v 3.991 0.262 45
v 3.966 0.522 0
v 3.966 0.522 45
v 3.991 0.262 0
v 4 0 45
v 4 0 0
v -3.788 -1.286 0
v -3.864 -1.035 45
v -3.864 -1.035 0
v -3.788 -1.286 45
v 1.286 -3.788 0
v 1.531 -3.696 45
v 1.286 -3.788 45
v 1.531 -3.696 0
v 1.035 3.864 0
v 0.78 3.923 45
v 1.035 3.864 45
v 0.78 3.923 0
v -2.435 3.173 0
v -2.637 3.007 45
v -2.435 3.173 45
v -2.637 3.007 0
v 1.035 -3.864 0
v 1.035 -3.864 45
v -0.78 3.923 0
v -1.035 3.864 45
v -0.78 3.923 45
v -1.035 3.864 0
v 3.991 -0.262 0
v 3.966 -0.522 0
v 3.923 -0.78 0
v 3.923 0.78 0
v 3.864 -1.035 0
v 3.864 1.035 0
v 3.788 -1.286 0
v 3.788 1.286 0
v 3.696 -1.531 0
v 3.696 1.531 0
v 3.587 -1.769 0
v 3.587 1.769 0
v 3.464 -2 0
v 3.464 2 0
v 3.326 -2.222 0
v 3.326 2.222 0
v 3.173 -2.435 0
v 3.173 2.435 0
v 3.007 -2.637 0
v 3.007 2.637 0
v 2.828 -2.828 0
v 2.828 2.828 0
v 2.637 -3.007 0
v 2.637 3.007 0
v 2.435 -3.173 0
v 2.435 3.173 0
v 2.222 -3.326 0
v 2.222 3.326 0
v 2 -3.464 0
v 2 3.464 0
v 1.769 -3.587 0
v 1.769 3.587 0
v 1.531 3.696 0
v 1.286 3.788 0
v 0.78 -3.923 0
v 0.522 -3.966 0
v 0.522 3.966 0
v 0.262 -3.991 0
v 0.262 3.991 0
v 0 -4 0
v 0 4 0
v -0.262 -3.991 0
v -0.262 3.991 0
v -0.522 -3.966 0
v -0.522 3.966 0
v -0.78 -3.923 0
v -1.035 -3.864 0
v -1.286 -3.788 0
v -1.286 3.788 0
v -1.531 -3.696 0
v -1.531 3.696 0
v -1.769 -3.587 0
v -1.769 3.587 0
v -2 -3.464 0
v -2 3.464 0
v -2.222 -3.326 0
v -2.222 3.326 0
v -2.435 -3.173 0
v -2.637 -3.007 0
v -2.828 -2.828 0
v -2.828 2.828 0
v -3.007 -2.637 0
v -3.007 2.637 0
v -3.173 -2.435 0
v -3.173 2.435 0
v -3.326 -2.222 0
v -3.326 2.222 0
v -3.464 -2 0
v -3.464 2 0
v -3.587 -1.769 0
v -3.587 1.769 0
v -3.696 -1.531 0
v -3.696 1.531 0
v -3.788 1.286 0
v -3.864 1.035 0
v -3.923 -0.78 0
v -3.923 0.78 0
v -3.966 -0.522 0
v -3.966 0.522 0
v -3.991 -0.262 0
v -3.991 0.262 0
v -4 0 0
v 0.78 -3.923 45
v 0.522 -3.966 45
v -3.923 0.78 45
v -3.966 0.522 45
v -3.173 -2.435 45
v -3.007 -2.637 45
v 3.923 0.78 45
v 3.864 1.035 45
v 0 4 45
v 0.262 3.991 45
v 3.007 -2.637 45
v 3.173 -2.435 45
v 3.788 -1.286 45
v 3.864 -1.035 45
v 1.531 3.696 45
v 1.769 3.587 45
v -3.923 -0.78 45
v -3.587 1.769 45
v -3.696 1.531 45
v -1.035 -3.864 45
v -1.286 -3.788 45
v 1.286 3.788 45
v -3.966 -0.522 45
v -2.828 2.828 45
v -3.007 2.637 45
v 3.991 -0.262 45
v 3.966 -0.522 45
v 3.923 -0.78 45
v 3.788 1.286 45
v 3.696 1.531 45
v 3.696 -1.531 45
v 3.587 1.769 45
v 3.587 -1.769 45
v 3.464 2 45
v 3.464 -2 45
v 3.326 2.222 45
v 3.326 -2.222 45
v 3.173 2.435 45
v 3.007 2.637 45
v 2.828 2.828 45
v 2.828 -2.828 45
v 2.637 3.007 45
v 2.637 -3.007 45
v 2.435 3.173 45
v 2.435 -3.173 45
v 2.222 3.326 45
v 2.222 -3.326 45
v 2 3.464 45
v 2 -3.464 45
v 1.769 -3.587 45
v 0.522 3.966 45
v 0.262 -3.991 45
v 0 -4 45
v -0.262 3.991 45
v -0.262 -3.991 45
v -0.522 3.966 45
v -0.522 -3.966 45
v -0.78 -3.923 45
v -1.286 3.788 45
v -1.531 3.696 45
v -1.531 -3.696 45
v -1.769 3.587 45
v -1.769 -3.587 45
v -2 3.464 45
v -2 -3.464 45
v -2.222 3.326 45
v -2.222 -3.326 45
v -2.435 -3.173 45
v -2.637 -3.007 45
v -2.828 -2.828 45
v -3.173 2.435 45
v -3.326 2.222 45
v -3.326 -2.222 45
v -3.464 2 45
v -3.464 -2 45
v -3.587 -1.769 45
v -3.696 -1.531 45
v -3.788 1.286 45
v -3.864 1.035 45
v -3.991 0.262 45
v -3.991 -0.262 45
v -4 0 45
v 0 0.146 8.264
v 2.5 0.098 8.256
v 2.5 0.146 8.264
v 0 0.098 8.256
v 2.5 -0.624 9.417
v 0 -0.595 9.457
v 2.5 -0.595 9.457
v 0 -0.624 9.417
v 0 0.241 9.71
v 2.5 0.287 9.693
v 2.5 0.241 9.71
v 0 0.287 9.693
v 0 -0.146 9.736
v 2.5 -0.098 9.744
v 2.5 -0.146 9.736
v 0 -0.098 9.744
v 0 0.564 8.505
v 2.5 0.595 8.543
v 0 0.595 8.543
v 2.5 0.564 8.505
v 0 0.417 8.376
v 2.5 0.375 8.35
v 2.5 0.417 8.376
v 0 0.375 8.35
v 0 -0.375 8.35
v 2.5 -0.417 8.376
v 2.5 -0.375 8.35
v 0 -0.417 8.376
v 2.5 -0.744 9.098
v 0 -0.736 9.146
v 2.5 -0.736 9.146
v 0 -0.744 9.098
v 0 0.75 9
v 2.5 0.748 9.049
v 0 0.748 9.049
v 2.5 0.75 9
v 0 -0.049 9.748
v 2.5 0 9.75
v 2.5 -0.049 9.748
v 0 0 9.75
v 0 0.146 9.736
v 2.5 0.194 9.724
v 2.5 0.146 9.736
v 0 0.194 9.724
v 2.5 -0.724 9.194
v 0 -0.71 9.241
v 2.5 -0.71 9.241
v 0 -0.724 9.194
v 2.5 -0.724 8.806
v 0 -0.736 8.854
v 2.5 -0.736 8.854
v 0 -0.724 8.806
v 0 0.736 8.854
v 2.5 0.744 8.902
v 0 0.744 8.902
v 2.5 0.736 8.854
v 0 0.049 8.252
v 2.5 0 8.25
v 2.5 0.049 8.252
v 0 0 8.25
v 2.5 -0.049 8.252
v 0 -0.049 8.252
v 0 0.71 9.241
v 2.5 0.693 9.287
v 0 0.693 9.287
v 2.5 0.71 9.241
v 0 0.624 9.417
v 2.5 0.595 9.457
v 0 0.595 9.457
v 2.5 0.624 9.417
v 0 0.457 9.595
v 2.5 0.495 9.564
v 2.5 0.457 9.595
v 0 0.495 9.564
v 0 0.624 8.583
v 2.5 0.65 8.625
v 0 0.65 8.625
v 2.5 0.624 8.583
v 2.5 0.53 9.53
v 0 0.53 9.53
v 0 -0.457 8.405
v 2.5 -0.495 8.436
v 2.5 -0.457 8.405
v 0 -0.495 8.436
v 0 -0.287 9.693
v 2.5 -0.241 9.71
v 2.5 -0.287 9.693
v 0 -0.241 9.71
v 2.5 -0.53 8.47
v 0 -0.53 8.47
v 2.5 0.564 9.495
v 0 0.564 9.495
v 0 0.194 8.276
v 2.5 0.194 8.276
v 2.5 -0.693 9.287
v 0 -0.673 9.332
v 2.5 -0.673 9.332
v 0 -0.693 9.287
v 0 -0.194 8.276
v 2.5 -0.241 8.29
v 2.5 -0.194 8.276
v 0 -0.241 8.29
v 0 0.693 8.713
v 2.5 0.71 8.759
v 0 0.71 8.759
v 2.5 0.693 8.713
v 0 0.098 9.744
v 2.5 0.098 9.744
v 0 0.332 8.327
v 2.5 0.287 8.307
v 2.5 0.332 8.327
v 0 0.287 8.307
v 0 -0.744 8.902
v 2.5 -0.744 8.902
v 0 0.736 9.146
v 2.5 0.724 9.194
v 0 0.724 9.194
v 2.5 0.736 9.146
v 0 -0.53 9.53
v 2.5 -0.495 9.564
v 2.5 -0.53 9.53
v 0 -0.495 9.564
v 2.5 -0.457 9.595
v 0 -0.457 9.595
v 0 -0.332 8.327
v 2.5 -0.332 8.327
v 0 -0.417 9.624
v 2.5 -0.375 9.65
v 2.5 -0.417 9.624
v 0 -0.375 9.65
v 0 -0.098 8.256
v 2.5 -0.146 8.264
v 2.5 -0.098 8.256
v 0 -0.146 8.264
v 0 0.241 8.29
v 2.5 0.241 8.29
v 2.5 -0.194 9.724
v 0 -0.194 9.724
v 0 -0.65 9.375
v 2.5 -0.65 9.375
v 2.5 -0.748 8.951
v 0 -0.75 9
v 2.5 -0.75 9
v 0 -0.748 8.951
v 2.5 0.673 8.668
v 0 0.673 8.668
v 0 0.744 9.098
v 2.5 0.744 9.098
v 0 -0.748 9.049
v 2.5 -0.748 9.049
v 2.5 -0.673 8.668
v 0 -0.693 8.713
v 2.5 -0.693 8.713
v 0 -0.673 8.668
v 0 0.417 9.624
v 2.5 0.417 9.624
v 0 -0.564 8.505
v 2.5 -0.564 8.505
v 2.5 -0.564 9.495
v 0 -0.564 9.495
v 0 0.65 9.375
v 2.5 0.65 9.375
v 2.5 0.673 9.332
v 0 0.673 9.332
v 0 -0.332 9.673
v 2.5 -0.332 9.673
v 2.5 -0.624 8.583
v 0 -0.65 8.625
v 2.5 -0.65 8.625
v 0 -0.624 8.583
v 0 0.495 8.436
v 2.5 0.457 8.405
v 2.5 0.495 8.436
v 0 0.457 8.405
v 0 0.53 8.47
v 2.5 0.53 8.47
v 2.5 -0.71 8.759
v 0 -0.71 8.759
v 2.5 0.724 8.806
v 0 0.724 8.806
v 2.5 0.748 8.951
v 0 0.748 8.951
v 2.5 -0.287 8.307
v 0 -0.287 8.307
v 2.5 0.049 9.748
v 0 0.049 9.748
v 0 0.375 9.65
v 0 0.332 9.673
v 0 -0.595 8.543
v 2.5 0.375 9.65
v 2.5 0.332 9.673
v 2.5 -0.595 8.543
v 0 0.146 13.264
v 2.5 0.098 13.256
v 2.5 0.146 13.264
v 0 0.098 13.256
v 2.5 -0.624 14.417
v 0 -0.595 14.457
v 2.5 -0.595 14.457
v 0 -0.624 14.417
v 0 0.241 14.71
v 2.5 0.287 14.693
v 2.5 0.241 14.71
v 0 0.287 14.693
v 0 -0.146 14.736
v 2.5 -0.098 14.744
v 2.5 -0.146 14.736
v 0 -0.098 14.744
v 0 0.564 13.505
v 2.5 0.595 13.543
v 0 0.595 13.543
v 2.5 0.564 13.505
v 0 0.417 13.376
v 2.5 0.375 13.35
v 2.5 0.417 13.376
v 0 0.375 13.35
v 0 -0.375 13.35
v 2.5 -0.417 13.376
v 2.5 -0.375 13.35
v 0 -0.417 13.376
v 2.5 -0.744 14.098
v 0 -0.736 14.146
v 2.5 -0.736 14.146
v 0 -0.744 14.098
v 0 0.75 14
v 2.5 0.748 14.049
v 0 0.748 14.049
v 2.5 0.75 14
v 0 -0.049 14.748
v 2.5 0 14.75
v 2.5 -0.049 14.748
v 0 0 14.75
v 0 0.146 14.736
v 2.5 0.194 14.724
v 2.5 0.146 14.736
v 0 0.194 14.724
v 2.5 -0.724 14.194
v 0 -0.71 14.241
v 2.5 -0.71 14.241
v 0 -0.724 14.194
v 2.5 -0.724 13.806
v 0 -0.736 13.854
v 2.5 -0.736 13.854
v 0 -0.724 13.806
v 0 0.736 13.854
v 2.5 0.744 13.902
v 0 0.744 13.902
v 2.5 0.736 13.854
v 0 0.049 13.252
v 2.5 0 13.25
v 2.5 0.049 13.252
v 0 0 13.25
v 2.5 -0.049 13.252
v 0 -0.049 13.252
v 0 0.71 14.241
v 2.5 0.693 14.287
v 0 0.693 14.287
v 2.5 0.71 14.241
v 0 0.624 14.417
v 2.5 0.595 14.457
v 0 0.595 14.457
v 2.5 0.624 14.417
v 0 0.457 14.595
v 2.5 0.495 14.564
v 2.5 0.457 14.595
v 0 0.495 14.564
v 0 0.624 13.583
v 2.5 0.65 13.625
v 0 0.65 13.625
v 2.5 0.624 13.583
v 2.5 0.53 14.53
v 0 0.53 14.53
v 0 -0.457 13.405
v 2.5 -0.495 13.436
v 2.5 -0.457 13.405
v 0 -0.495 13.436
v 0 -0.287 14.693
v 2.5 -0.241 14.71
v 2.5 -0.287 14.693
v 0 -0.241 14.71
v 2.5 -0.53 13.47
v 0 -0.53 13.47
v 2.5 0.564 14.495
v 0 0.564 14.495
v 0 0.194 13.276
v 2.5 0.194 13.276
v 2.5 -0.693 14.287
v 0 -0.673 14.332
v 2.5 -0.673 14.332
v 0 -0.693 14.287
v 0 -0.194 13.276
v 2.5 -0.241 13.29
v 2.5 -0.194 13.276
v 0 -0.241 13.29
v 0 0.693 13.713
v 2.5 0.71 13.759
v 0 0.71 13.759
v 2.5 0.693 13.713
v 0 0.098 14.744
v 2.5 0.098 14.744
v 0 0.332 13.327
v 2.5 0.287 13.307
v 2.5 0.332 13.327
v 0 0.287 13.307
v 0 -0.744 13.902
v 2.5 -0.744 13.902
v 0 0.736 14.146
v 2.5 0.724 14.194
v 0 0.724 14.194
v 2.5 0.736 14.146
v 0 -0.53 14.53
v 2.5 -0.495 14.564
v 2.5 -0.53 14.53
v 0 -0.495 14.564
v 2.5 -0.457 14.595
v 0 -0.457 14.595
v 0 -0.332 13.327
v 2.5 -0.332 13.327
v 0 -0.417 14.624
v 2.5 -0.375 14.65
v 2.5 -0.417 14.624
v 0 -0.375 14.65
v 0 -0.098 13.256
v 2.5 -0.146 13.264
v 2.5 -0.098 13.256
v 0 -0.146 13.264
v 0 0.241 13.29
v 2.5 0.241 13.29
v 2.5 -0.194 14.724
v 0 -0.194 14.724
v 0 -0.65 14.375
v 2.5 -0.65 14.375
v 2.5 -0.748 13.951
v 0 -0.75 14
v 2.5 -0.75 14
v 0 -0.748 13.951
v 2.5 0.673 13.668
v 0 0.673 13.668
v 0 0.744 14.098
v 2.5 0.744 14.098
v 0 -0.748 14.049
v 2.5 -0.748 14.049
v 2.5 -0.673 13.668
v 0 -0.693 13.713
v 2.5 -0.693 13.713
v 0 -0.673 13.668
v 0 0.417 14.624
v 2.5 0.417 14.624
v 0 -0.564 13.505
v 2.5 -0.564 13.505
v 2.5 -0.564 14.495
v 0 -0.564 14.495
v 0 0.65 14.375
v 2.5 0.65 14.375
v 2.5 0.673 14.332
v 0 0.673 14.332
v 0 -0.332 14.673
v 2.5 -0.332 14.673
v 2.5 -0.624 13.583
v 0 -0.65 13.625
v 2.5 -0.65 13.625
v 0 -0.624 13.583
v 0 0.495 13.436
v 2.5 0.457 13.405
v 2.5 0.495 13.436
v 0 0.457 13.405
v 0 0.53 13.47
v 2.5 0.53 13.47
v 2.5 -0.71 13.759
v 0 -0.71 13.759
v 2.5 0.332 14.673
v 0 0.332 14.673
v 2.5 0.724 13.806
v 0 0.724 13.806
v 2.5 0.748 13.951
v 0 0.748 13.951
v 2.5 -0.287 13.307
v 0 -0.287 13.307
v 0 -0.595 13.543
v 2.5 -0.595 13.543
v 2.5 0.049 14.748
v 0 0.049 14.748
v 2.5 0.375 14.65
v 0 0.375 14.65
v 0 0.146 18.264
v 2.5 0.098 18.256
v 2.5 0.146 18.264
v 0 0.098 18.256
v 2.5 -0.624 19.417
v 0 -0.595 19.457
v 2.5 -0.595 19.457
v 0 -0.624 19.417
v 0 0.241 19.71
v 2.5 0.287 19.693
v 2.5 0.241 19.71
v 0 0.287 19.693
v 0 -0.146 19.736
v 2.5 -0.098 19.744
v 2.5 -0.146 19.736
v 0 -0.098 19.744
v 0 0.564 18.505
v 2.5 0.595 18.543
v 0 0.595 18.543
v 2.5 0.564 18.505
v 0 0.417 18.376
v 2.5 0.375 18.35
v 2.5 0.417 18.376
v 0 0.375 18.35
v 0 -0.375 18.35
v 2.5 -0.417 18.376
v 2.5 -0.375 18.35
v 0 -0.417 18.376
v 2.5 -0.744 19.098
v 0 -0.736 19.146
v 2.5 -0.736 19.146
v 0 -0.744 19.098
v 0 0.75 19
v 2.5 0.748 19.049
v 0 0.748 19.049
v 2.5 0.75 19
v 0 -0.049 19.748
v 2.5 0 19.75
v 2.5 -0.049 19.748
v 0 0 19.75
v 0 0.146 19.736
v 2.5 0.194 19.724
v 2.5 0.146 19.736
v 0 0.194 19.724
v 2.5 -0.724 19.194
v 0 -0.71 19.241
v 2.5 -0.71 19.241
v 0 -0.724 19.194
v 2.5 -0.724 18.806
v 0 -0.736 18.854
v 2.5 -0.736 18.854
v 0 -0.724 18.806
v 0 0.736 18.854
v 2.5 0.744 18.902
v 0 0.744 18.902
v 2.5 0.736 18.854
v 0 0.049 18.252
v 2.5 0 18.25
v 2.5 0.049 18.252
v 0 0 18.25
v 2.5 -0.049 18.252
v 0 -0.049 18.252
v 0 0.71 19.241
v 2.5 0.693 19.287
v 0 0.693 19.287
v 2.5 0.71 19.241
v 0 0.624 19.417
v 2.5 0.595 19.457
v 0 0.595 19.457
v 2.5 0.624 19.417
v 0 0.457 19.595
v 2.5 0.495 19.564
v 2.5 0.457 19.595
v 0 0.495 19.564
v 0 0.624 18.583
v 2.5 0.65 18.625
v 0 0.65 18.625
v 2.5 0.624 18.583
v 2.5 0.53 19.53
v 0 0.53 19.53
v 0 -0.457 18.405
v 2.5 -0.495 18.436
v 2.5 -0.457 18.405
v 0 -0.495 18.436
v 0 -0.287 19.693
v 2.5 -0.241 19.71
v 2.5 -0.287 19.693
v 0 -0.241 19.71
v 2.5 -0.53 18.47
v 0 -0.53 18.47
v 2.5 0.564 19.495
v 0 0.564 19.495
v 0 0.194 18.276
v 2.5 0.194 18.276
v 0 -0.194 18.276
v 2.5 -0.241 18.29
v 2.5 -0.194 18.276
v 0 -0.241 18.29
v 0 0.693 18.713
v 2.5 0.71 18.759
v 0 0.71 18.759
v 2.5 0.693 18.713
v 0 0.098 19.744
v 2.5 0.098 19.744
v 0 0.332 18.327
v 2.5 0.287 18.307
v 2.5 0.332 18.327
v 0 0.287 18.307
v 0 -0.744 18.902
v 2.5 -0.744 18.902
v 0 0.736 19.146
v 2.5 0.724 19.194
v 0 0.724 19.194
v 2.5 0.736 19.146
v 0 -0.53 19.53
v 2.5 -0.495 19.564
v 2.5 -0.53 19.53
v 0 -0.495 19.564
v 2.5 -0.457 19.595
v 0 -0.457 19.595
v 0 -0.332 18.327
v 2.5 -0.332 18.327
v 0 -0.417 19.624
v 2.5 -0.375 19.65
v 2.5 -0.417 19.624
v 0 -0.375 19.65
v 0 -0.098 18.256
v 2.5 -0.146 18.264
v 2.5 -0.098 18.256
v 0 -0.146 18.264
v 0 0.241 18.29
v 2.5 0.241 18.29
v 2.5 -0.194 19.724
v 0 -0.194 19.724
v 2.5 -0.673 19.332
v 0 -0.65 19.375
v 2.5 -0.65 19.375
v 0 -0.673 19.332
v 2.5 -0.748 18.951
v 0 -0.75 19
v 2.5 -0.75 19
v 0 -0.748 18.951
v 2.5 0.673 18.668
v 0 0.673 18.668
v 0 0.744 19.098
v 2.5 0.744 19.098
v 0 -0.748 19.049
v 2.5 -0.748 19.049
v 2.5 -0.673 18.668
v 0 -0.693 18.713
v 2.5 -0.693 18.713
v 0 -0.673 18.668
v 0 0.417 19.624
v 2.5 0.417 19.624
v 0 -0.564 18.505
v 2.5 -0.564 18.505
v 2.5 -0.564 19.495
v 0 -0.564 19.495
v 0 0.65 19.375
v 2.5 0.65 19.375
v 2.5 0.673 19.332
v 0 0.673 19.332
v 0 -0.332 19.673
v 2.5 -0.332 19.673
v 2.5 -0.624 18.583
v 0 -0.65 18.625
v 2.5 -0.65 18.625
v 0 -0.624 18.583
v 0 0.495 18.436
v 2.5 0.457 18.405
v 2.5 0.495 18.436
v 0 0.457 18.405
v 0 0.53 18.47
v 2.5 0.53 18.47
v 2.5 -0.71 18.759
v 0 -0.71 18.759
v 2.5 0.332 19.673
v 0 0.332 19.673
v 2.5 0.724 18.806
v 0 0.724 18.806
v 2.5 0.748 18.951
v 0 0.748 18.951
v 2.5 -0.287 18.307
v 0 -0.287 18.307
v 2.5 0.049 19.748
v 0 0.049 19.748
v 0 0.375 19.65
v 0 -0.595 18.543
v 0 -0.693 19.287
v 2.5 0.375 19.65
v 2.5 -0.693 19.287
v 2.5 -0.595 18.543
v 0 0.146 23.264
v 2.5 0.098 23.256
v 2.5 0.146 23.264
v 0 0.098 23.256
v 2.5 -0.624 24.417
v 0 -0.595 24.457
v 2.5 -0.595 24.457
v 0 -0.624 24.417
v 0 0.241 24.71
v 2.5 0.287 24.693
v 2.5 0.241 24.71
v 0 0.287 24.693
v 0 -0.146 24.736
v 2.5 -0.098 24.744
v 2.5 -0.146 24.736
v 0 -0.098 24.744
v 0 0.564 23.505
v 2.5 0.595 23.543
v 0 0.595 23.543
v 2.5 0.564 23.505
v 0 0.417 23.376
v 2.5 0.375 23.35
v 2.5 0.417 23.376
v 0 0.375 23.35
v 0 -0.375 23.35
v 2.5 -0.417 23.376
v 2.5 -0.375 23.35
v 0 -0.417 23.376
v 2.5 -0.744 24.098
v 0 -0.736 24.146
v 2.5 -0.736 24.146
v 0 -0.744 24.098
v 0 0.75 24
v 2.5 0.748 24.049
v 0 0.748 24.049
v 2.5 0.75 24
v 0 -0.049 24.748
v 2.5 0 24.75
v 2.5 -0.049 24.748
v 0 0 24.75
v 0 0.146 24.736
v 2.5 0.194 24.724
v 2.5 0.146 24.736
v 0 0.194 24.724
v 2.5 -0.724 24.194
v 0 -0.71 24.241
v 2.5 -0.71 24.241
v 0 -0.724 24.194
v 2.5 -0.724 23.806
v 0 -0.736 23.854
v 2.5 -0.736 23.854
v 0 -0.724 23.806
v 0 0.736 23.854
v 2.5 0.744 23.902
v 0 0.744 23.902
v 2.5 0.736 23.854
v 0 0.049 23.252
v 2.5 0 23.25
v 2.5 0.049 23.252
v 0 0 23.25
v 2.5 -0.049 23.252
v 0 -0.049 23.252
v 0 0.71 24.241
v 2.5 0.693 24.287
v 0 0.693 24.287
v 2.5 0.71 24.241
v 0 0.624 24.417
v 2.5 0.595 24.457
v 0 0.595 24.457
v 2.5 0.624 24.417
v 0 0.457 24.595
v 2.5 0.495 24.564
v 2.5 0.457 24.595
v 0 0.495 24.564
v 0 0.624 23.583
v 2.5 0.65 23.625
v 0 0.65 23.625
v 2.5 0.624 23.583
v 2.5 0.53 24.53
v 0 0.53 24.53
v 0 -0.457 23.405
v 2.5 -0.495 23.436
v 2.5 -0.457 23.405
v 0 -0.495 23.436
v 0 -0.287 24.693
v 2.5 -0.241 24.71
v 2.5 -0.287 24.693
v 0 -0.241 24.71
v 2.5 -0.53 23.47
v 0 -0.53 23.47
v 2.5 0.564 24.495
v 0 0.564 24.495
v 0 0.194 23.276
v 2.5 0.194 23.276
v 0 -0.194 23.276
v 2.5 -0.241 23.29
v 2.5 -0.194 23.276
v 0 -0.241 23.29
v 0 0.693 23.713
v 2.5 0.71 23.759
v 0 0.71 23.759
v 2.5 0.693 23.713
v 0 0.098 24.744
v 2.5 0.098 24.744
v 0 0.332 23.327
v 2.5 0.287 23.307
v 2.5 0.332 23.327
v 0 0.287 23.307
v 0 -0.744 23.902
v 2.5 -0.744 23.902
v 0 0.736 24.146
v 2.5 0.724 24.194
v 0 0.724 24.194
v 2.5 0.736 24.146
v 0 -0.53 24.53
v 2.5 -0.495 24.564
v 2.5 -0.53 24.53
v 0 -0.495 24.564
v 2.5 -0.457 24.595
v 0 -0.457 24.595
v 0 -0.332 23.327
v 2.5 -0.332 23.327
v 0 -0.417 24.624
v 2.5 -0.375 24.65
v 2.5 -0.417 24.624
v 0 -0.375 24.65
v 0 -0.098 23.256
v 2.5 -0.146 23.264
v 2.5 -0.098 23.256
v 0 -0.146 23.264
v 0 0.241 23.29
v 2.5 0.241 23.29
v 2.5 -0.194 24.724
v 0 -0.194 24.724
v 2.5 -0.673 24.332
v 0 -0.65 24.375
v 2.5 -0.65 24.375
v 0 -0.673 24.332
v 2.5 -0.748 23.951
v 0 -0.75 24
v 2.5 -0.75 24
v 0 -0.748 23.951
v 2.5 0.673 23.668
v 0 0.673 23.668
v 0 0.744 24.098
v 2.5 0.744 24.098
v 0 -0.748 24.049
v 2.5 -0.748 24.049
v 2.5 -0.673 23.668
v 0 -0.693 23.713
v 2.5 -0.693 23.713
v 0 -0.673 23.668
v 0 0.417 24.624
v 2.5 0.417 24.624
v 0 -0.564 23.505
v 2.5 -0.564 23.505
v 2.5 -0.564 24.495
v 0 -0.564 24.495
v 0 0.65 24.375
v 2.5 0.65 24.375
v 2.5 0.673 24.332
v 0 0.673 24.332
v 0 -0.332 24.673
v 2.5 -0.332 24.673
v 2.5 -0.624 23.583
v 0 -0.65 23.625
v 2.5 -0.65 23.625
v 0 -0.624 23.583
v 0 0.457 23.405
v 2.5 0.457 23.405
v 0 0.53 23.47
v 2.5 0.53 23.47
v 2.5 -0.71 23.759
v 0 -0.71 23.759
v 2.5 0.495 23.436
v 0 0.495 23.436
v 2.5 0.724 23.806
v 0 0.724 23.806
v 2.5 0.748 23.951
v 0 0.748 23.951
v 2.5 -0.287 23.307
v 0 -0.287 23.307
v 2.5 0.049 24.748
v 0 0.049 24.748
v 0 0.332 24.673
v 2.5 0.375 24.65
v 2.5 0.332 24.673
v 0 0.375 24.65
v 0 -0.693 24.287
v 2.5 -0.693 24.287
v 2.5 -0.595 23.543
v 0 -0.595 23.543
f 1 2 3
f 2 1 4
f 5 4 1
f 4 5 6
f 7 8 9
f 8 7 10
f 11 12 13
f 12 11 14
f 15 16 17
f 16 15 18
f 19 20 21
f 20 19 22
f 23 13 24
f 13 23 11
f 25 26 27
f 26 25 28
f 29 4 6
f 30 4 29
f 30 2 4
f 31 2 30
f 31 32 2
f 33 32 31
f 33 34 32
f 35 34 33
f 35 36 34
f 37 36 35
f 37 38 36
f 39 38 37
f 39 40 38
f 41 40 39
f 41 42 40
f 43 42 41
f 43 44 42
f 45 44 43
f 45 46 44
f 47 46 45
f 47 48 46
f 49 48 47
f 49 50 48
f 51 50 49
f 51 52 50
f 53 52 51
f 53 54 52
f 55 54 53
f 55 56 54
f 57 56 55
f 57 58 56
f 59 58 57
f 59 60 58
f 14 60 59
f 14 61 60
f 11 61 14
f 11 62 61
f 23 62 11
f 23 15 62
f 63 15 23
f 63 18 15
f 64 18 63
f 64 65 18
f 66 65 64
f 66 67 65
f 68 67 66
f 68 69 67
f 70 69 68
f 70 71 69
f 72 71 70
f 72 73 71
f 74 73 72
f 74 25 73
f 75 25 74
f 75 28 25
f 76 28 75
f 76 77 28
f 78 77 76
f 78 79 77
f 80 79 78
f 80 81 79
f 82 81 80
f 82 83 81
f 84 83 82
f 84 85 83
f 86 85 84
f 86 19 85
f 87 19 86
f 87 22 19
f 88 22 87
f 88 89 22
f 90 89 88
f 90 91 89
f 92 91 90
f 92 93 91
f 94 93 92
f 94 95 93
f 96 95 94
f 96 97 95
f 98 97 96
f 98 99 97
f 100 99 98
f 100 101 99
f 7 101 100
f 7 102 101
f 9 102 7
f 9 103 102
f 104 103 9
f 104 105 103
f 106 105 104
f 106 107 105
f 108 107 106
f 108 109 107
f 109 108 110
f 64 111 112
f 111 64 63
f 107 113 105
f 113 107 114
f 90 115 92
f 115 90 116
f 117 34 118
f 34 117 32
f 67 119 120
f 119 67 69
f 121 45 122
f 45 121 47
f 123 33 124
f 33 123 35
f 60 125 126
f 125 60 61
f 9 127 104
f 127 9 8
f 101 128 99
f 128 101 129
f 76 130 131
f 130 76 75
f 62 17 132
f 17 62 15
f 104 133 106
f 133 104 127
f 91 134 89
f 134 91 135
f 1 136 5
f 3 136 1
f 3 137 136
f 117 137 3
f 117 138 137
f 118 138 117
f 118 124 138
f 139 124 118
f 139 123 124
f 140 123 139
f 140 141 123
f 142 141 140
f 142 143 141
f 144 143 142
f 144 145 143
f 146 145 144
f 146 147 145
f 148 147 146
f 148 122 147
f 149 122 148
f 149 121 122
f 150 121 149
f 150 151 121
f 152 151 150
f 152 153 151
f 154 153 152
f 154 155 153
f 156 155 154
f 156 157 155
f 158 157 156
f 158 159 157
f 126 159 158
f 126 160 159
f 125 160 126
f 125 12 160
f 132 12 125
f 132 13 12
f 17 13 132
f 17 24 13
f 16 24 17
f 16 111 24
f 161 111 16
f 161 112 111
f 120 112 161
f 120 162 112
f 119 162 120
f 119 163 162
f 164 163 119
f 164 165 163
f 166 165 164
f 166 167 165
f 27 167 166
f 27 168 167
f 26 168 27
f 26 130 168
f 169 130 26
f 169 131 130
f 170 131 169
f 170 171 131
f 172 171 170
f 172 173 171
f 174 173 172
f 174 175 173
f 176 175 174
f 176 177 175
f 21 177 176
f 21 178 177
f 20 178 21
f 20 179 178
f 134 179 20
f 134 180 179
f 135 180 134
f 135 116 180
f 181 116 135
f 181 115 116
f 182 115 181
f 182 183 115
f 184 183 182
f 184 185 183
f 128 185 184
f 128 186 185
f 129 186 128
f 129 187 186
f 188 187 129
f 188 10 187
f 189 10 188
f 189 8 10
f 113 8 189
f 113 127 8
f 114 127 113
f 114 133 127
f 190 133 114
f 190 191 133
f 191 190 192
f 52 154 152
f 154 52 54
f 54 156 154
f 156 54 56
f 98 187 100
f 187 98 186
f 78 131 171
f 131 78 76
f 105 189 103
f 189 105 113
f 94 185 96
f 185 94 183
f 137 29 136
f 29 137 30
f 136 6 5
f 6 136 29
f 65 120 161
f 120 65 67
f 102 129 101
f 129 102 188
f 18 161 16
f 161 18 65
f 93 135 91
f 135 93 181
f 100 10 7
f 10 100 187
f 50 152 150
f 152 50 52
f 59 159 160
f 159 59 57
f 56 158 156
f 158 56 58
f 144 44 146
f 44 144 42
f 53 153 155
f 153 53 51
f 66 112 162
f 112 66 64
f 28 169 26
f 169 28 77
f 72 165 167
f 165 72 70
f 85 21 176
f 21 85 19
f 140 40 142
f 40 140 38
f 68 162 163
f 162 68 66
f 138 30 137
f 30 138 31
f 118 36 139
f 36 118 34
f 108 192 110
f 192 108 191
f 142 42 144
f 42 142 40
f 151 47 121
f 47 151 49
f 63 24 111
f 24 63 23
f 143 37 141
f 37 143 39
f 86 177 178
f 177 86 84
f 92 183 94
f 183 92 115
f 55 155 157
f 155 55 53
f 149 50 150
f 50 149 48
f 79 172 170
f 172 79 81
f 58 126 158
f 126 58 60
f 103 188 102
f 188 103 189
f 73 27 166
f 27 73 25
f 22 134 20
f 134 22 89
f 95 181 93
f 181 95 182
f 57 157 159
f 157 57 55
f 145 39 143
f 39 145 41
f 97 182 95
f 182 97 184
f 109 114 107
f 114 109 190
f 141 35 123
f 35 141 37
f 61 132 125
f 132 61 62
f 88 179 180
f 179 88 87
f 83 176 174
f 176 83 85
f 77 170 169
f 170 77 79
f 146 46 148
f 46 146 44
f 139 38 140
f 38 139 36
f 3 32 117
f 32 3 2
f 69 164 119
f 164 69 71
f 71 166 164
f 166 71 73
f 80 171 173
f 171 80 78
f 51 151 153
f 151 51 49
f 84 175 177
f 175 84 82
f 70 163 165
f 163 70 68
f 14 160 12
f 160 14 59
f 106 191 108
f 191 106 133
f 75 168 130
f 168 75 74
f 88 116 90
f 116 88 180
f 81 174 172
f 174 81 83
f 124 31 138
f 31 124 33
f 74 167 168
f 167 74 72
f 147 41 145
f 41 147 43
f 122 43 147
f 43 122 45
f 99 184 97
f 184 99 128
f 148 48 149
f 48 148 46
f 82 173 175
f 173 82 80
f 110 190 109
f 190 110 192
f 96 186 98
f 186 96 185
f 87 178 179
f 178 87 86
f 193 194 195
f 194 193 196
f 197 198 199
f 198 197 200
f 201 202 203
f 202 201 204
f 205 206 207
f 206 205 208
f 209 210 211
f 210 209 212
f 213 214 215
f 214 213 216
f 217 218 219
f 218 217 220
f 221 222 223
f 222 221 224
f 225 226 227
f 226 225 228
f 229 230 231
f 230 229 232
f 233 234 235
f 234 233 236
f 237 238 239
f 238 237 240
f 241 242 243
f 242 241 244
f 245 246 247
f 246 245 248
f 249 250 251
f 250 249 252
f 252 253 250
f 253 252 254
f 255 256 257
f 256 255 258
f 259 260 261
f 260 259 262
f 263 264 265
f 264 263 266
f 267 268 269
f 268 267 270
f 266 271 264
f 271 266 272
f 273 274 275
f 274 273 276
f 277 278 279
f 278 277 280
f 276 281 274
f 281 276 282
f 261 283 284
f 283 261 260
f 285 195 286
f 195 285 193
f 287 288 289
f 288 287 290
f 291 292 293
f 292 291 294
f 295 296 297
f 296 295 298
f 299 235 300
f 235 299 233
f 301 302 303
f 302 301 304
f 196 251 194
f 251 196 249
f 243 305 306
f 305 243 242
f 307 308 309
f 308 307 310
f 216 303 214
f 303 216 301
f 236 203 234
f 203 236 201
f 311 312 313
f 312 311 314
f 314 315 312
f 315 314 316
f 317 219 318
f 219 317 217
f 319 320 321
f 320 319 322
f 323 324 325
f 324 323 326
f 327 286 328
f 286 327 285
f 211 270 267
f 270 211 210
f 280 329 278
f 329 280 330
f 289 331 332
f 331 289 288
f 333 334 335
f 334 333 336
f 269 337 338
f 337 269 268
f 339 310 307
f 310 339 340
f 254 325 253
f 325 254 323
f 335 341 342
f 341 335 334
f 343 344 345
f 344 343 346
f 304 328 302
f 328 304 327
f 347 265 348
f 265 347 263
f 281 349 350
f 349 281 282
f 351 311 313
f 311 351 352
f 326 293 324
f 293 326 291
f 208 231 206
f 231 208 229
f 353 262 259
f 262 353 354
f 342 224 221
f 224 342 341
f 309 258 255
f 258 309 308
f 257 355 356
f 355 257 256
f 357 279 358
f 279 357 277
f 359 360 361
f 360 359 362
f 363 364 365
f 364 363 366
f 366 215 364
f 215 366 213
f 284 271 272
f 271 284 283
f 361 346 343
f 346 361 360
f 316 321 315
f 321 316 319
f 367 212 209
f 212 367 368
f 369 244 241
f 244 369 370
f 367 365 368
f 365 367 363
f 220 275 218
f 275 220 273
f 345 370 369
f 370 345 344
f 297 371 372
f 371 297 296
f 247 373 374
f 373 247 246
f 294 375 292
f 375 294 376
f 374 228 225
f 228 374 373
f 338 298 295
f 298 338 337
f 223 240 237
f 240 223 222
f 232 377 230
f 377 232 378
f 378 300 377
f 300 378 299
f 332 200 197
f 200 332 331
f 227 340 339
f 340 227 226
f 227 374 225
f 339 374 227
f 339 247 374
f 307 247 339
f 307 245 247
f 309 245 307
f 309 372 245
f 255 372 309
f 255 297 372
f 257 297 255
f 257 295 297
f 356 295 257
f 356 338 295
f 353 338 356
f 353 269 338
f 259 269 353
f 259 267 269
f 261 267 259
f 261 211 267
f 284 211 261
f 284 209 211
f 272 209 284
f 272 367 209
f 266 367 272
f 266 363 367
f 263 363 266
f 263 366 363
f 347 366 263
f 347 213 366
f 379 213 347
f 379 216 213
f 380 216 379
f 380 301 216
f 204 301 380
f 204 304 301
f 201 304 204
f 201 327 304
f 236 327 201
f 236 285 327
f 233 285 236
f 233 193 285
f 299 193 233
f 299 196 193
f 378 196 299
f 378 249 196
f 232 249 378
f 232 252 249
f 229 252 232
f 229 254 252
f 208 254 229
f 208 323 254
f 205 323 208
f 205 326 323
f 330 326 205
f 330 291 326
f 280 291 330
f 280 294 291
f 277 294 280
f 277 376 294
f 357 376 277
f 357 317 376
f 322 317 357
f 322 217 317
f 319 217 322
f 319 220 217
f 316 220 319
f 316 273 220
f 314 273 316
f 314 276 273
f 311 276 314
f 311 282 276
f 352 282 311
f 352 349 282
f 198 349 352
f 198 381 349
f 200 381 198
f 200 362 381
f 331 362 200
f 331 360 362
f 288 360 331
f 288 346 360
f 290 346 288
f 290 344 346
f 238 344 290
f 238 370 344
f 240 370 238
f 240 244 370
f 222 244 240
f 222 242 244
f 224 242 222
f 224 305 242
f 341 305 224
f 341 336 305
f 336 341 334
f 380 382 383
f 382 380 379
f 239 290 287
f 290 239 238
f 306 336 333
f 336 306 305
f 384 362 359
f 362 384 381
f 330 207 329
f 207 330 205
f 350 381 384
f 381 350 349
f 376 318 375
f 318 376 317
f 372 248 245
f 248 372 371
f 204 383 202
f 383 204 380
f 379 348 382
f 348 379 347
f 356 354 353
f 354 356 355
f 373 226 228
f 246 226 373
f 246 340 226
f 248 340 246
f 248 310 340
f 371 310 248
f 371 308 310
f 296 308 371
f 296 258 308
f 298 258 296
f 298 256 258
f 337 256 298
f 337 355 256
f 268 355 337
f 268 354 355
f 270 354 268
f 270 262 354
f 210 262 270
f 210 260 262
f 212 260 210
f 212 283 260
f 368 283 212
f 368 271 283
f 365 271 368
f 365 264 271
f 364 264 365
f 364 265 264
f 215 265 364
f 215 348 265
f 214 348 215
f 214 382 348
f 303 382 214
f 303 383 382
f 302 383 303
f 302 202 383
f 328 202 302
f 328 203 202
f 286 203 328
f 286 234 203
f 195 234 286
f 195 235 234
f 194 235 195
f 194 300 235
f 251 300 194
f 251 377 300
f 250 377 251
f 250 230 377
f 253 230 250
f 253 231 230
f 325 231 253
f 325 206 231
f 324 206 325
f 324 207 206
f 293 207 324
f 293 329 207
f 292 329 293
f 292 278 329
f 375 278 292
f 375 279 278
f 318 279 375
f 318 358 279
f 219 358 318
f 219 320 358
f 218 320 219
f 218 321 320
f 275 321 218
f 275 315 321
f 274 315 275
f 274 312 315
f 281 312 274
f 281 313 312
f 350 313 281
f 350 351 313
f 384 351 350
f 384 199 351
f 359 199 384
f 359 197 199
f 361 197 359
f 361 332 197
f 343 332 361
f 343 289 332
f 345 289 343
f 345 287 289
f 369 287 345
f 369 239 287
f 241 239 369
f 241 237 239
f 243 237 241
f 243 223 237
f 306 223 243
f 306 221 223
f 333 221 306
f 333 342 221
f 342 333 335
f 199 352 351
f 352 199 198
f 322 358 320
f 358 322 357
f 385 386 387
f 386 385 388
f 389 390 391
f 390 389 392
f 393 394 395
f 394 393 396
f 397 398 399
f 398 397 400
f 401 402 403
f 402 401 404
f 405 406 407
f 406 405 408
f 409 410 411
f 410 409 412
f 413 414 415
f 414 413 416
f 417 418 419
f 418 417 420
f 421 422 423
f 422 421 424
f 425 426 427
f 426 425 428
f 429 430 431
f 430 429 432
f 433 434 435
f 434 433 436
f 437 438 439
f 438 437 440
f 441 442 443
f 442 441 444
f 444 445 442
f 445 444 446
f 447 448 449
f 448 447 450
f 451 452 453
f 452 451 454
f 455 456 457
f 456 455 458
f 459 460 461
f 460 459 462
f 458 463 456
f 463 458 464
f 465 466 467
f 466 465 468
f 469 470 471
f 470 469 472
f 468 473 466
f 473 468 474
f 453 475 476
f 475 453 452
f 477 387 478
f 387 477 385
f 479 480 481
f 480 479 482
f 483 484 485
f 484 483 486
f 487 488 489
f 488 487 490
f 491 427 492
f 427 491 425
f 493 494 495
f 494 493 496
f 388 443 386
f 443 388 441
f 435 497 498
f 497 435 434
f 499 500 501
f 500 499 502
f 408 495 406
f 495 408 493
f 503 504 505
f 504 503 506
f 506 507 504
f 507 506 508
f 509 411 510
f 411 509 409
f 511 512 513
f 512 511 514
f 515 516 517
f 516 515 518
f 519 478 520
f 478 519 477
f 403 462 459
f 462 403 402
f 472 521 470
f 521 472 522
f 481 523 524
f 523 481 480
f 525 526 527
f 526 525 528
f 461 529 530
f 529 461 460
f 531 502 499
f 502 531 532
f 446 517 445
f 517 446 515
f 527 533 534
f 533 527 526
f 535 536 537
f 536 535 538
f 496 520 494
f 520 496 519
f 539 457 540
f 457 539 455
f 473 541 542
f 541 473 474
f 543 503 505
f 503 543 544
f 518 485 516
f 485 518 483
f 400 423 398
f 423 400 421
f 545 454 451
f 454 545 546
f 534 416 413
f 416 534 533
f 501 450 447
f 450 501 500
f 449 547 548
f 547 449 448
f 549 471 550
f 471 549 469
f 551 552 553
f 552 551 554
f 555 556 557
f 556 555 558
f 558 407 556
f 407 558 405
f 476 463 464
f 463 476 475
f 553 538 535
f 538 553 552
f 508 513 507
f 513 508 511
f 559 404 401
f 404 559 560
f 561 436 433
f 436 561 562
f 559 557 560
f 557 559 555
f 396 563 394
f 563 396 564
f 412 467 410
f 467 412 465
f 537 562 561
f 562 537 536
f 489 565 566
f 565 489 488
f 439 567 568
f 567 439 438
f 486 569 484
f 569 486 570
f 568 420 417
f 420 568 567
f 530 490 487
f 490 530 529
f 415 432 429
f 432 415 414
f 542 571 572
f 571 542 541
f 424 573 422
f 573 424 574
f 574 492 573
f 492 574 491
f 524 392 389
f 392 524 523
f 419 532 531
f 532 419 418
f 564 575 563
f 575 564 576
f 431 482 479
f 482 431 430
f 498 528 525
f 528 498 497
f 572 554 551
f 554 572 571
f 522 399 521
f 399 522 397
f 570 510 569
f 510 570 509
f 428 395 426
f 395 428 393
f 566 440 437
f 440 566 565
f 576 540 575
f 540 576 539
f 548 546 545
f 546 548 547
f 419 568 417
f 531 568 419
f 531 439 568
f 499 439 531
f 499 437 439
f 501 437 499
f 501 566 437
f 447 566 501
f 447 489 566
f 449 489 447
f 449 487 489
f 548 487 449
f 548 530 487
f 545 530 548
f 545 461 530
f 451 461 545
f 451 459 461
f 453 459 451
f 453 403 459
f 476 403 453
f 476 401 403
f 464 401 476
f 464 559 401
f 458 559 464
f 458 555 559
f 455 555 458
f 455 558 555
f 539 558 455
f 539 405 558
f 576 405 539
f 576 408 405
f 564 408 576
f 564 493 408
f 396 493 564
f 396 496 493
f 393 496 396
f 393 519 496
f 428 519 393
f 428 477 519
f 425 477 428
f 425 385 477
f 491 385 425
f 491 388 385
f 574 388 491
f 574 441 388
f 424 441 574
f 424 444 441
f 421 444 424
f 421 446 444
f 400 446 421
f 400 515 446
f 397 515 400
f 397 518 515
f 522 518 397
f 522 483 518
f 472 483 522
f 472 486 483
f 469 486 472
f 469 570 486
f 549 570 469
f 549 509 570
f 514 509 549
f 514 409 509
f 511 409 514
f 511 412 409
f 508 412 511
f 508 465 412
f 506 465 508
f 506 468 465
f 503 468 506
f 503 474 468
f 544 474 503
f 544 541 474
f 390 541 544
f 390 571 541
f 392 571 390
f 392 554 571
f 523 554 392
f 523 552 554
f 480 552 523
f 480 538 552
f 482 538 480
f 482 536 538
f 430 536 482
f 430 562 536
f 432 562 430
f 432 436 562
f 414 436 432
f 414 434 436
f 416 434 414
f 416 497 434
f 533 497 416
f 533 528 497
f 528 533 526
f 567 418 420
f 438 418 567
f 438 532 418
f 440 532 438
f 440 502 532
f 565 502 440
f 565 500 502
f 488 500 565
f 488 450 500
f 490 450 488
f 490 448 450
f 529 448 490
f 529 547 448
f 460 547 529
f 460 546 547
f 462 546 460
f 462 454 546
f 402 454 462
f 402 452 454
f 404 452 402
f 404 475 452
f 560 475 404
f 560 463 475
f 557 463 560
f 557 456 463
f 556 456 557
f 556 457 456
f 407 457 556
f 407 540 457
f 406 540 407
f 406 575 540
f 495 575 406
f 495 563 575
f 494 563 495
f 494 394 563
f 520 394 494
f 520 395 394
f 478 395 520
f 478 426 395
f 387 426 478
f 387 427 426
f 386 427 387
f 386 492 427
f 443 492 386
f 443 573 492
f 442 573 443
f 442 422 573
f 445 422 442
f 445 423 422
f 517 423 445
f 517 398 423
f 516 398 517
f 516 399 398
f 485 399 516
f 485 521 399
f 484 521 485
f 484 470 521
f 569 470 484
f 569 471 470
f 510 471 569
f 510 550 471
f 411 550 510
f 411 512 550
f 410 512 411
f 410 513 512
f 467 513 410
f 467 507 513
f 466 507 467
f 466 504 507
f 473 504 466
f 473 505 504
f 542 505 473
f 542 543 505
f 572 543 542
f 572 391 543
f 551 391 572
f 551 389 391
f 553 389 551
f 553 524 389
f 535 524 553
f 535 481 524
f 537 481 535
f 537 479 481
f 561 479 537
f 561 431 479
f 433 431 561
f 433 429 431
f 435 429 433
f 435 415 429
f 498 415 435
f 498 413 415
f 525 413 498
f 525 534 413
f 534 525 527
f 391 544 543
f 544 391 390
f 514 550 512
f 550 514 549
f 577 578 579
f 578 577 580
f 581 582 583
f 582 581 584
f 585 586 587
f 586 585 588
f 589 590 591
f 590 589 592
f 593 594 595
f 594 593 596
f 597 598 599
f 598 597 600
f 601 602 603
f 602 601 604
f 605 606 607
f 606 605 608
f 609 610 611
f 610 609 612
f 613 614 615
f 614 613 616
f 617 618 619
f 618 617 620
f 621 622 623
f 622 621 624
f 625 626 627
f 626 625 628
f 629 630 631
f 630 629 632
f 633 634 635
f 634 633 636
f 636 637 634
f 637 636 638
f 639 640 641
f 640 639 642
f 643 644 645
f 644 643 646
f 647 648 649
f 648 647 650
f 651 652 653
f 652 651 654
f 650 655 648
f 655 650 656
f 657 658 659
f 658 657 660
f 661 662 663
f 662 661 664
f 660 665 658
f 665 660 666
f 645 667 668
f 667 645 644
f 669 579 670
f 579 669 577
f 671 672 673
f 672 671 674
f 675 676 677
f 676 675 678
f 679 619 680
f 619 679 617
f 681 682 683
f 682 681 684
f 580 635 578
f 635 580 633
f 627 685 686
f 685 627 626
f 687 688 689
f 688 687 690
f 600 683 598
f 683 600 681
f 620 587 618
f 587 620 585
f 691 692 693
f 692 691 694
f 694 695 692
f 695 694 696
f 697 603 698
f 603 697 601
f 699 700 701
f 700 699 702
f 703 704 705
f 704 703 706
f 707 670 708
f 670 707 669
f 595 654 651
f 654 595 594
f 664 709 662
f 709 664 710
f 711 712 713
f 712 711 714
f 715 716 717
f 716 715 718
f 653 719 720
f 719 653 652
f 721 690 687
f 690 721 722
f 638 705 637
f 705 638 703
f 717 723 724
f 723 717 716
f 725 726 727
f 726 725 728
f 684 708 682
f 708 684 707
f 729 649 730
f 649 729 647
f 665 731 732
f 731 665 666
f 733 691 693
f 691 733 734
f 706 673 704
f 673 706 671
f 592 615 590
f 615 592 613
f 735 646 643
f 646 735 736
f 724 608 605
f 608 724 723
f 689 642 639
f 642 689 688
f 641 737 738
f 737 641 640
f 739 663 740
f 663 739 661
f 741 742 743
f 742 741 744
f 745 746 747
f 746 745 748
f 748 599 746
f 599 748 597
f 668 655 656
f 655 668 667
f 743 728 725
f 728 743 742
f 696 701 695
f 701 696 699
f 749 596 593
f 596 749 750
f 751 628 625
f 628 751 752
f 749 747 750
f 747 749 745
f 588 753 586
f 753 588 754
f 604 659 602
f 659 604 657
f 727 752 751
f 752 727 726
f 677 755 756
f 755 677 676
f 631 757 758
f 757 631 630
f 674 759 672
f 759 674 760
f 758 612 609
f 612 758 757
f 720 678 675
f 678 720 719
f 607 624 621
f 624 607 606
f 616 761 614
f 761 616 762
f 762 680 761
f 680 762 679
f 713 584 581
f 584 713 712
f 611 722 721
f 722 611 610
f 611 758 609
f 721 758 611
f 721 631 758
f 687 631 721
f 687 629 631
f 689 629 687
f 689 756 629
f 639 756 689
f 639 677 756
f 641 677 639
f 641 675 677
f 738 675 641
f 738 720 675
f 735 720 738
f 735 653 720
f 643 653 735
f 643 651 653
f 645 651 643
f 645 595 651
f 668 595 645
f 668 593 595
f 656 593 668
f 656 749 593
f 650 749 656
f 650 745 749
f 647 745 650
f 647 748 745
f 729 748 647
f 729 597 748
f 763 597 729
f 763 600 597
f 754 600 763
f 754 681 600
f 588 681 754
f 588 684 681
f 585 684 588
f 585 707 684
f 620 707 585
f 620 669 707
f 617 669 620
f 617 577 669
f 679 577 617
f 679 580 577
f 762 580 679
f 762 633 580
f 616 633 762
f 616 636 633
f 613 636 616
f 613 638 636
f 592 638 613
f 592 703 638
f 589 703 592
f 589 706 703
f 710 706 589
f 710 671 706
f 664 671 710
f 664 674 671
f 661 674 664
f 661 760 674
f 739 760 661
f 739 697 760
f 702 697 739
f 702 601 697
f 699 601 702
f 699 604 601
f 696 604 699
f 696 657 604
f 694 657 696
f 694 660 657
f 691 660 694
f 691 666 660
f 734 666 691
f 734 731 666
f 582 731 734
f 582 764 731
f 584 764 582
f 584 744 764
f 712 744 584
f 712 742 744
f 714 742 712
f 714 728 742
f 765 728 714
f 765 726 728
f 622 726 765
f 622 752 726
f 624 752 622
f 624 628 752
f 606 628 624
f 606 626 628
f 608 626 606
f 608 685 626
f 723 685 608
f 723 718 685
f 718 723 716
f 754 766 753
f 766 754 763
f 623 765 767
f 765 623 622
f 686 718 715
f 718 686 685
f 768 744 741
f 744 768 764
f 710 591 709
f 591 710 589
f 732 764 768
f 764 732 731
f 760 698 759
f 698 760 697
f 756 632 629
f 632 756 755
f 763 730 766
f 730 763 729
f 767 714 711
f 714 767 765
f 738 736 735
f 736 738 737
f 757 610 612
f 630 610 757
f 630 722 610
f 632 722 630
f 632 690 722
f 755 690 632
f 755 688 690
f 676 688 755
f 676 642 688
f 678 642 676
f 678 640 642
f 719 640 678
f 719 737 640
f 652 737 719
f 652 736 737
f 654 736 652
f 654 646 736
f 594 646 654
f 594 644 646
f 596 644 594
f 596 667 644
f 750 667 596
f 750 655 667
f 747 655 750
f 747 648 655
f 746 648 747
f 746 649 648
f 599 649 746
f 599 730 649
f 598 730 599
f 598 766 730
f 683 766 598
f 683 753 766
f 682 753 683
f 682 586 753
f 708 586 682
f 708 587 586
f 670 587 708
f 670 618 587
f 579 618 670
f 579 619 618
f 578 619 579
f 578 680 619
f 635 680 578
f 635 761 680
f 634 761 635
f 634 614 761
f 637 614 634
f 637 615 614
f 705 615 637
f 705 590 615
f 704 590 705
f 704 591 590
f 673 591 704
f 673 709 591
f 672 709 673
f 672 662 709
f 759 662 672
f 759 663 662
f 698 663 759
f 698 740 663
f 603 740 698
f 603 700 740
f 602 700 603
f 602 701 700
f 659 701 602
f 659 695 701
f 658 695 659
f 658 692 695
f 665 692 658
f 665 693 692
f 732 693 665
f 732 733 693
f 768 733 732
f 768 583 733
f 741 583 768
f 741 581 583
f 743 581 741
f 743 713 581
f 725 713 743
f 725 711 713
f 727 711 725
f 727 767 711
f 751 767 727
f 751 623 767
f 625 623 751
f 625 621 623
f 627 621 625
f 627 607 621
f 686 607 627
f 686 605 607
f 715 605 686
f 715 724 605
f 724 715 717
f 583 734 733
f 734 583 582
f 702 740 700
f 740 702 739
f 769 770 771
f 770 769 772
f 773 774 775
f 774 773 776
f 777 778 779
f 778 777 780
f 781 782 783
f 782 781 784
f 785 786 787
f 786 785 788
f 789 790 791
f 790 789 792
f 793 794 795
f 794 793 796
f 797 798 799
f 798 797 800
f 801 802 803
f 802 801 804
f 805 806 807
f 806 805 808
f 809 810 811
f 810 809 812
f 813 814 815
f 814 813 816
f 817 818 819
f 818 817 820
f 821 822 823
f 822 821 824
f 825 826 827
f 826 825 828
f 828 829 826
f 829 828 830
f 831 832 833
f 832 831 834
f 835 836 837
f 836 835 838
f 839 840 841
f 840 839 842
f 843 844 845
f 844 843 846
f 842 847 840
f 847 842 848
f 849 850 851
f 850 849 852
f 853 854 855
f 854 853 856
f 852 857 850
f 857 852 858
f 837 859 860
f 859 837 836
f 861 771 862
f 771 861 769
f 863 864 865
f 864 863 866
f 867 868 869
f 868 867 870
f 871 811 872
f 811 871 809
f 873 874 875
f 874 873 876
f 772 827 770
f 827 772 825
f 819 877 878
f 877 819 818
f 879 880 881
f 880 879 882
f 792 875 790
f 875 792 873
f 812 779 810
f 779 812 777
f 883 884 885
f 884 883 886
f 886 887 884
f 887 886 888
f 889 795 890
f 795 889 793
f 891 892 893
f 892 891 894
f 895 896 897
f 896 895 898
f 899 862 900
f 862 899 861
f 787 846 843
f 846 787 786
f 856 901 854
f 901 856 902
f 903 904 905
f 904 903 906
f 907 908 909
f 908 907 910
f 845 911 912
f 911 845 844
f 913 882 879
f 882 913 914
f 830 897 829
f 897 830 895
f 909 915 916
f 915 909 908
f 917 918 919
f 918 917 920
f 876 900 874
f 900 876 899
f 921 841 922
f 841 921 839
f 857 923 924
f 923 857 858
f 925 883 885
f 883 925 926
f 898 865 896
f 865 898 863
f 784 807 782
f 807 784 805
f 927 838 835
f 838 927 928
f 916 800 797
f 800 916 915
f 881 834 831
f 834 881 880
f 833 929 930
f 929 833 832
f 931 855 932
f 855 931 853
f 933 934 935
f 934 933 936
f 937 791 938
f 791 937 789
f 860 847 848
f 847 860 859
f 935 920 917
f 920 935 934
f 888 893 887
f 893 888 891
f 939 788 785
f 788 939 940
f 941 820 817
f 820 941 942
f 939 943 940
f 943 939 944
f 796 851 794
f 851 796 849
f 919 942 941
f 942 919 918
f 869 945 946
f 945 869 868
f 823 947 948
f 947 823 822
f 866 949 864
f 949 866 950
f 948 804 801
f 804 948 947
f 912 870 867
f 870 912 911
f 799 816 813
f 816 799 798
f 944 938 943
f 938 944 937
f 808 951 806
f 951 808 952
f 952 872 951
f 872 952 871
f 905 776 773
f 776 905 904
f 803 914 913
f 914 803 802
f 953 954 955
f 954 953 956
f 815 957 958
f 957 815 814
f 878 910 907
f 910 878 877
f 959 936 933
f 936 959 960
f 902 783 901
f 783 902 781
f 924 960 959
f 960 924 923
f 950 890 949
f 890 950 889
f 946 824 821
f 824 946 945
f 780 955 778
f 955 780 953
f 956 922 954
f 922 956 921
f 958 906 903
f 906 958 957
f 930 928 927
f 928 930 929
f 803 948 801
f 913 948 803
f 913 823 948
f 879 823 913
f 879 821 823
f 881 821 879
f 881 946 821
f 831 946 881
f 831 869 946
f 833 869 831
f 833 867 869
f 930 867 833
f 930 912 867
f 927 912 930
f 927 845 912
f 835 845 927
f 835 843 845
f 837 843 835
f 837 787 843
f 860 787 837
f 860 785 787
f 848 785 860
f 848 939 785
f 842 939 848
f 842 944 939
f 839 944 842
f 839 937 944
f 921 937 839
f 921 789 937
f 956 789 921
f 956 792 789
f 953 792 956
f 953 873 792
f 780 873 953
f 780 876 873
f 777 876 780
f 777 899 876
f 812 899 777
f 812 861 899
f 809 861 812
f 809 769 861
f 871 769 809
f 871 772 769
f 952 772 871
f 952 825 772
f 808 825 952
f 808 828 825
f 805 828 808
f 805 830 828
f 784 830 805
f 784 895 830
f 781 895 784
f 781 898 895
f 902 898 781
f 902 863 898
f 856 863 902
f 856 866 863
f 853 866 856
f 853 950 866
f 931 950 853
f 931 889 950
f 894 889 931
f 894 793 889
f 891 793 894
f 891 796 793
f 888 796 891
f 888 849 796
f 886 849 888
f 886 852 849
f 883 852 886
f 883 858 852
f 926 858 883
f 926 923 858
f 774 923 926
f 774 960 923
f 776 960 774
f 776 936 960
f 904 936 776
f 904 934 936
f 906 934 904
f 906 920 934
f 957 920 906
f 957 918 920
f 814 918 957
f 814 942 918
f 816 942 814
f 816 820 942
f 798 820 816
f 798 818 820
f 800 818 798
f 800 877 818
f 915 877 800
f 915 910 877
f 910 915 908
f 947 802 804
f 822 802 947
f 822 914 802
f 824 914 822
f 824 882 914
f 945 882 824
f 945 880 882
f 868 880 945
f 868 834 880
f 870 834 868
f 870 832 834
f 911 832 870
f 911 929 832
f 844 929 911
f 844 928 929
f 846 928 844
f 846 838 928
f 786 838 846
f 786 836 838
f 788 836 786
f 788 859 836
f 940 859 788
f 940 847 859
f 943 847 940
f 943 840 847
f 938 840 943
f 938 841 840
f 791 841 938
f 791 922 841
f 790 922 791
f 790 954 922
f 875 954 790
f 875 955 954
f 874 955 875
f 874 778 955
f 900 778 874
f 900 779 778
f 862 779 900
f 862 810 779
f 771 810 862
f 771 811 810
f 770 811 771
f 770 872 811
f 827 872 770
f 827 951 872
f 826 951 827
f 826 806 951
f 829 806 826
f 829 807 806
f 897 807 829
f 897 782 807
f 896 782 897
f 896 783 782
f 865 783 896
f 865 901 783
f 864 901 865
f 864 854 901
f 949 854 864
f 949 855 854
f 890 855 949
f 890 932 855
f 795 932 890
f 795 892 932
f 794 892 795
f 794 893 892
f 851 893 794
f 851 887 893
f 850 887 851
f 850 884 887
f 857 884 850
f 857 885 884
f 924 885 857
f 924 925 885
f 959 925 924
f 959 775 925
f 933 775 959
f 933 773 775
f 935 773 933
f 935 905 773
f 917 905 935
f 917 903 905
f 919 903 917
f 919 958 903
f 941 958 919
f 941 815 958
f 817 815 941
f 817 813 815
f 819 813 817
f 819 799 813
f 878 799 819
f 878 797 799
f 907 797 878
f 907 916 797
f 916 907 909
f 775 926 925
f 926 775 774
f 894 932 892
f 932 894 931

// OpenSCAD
// Pestle for grinding tissue inside a 1.5 mL microcentrifuge tube
// Print orientation: standing upright (handle on the bed, tip up)

// ---------------- Parameters ----------------
handle_d      = 8;    // handle diameter (mm)
handle_h      = 45;   // handle height (mm), z = 0 to 45
cone_top_d    = 8;    // cone base diameter at z = 45 (mm)
cone_tip_d    = 3;    // cone tip diameter at z = 62 (mm)
tip_r         = 1.5;  // rounded tip radius (mm), sphere centred at z = 62
groove_count  = 4;    // number of circumferential grip grooves
groove_w      = 2;    // groove width (mm), in Z
groove_depth  = 1;    // groove depth (mm)
groove_z      = [10, 15, 20, 25]; // groove centre heights (mm)
eps           = 0.5;  // overshoot for clean boolean cuts (mm)

$fn = 96;             // curve resolution

// ---------------- Model ----------------
difference() {
    union() {
        // (1) Cylindrical handle
        cylinder(d = handle_d, h = handle_h);

        // (2) Cone: tapers from 8 mm at z = 45 to 3 mm at z = 62
        translate([0, 0, handle_h])
            cylinder(d1 = cone_top_d, d2 = cone_tip_d, h = cone_tip_d - handle_h);

        // (3) Rounded tip: 3 mm sphere centred at z = 62
        translate([0, 0, cone_tip_d])
            sphere(r = tip_r);
    }

    // Grip grooves, cut through the handle wall
    for (z = groove_z)
        translate([0, 0, z - groove_w / 2])
            rotate([0, 90, 0])
                cylinder(d = groove_depth + eps, h = groove_w + eps);
}
